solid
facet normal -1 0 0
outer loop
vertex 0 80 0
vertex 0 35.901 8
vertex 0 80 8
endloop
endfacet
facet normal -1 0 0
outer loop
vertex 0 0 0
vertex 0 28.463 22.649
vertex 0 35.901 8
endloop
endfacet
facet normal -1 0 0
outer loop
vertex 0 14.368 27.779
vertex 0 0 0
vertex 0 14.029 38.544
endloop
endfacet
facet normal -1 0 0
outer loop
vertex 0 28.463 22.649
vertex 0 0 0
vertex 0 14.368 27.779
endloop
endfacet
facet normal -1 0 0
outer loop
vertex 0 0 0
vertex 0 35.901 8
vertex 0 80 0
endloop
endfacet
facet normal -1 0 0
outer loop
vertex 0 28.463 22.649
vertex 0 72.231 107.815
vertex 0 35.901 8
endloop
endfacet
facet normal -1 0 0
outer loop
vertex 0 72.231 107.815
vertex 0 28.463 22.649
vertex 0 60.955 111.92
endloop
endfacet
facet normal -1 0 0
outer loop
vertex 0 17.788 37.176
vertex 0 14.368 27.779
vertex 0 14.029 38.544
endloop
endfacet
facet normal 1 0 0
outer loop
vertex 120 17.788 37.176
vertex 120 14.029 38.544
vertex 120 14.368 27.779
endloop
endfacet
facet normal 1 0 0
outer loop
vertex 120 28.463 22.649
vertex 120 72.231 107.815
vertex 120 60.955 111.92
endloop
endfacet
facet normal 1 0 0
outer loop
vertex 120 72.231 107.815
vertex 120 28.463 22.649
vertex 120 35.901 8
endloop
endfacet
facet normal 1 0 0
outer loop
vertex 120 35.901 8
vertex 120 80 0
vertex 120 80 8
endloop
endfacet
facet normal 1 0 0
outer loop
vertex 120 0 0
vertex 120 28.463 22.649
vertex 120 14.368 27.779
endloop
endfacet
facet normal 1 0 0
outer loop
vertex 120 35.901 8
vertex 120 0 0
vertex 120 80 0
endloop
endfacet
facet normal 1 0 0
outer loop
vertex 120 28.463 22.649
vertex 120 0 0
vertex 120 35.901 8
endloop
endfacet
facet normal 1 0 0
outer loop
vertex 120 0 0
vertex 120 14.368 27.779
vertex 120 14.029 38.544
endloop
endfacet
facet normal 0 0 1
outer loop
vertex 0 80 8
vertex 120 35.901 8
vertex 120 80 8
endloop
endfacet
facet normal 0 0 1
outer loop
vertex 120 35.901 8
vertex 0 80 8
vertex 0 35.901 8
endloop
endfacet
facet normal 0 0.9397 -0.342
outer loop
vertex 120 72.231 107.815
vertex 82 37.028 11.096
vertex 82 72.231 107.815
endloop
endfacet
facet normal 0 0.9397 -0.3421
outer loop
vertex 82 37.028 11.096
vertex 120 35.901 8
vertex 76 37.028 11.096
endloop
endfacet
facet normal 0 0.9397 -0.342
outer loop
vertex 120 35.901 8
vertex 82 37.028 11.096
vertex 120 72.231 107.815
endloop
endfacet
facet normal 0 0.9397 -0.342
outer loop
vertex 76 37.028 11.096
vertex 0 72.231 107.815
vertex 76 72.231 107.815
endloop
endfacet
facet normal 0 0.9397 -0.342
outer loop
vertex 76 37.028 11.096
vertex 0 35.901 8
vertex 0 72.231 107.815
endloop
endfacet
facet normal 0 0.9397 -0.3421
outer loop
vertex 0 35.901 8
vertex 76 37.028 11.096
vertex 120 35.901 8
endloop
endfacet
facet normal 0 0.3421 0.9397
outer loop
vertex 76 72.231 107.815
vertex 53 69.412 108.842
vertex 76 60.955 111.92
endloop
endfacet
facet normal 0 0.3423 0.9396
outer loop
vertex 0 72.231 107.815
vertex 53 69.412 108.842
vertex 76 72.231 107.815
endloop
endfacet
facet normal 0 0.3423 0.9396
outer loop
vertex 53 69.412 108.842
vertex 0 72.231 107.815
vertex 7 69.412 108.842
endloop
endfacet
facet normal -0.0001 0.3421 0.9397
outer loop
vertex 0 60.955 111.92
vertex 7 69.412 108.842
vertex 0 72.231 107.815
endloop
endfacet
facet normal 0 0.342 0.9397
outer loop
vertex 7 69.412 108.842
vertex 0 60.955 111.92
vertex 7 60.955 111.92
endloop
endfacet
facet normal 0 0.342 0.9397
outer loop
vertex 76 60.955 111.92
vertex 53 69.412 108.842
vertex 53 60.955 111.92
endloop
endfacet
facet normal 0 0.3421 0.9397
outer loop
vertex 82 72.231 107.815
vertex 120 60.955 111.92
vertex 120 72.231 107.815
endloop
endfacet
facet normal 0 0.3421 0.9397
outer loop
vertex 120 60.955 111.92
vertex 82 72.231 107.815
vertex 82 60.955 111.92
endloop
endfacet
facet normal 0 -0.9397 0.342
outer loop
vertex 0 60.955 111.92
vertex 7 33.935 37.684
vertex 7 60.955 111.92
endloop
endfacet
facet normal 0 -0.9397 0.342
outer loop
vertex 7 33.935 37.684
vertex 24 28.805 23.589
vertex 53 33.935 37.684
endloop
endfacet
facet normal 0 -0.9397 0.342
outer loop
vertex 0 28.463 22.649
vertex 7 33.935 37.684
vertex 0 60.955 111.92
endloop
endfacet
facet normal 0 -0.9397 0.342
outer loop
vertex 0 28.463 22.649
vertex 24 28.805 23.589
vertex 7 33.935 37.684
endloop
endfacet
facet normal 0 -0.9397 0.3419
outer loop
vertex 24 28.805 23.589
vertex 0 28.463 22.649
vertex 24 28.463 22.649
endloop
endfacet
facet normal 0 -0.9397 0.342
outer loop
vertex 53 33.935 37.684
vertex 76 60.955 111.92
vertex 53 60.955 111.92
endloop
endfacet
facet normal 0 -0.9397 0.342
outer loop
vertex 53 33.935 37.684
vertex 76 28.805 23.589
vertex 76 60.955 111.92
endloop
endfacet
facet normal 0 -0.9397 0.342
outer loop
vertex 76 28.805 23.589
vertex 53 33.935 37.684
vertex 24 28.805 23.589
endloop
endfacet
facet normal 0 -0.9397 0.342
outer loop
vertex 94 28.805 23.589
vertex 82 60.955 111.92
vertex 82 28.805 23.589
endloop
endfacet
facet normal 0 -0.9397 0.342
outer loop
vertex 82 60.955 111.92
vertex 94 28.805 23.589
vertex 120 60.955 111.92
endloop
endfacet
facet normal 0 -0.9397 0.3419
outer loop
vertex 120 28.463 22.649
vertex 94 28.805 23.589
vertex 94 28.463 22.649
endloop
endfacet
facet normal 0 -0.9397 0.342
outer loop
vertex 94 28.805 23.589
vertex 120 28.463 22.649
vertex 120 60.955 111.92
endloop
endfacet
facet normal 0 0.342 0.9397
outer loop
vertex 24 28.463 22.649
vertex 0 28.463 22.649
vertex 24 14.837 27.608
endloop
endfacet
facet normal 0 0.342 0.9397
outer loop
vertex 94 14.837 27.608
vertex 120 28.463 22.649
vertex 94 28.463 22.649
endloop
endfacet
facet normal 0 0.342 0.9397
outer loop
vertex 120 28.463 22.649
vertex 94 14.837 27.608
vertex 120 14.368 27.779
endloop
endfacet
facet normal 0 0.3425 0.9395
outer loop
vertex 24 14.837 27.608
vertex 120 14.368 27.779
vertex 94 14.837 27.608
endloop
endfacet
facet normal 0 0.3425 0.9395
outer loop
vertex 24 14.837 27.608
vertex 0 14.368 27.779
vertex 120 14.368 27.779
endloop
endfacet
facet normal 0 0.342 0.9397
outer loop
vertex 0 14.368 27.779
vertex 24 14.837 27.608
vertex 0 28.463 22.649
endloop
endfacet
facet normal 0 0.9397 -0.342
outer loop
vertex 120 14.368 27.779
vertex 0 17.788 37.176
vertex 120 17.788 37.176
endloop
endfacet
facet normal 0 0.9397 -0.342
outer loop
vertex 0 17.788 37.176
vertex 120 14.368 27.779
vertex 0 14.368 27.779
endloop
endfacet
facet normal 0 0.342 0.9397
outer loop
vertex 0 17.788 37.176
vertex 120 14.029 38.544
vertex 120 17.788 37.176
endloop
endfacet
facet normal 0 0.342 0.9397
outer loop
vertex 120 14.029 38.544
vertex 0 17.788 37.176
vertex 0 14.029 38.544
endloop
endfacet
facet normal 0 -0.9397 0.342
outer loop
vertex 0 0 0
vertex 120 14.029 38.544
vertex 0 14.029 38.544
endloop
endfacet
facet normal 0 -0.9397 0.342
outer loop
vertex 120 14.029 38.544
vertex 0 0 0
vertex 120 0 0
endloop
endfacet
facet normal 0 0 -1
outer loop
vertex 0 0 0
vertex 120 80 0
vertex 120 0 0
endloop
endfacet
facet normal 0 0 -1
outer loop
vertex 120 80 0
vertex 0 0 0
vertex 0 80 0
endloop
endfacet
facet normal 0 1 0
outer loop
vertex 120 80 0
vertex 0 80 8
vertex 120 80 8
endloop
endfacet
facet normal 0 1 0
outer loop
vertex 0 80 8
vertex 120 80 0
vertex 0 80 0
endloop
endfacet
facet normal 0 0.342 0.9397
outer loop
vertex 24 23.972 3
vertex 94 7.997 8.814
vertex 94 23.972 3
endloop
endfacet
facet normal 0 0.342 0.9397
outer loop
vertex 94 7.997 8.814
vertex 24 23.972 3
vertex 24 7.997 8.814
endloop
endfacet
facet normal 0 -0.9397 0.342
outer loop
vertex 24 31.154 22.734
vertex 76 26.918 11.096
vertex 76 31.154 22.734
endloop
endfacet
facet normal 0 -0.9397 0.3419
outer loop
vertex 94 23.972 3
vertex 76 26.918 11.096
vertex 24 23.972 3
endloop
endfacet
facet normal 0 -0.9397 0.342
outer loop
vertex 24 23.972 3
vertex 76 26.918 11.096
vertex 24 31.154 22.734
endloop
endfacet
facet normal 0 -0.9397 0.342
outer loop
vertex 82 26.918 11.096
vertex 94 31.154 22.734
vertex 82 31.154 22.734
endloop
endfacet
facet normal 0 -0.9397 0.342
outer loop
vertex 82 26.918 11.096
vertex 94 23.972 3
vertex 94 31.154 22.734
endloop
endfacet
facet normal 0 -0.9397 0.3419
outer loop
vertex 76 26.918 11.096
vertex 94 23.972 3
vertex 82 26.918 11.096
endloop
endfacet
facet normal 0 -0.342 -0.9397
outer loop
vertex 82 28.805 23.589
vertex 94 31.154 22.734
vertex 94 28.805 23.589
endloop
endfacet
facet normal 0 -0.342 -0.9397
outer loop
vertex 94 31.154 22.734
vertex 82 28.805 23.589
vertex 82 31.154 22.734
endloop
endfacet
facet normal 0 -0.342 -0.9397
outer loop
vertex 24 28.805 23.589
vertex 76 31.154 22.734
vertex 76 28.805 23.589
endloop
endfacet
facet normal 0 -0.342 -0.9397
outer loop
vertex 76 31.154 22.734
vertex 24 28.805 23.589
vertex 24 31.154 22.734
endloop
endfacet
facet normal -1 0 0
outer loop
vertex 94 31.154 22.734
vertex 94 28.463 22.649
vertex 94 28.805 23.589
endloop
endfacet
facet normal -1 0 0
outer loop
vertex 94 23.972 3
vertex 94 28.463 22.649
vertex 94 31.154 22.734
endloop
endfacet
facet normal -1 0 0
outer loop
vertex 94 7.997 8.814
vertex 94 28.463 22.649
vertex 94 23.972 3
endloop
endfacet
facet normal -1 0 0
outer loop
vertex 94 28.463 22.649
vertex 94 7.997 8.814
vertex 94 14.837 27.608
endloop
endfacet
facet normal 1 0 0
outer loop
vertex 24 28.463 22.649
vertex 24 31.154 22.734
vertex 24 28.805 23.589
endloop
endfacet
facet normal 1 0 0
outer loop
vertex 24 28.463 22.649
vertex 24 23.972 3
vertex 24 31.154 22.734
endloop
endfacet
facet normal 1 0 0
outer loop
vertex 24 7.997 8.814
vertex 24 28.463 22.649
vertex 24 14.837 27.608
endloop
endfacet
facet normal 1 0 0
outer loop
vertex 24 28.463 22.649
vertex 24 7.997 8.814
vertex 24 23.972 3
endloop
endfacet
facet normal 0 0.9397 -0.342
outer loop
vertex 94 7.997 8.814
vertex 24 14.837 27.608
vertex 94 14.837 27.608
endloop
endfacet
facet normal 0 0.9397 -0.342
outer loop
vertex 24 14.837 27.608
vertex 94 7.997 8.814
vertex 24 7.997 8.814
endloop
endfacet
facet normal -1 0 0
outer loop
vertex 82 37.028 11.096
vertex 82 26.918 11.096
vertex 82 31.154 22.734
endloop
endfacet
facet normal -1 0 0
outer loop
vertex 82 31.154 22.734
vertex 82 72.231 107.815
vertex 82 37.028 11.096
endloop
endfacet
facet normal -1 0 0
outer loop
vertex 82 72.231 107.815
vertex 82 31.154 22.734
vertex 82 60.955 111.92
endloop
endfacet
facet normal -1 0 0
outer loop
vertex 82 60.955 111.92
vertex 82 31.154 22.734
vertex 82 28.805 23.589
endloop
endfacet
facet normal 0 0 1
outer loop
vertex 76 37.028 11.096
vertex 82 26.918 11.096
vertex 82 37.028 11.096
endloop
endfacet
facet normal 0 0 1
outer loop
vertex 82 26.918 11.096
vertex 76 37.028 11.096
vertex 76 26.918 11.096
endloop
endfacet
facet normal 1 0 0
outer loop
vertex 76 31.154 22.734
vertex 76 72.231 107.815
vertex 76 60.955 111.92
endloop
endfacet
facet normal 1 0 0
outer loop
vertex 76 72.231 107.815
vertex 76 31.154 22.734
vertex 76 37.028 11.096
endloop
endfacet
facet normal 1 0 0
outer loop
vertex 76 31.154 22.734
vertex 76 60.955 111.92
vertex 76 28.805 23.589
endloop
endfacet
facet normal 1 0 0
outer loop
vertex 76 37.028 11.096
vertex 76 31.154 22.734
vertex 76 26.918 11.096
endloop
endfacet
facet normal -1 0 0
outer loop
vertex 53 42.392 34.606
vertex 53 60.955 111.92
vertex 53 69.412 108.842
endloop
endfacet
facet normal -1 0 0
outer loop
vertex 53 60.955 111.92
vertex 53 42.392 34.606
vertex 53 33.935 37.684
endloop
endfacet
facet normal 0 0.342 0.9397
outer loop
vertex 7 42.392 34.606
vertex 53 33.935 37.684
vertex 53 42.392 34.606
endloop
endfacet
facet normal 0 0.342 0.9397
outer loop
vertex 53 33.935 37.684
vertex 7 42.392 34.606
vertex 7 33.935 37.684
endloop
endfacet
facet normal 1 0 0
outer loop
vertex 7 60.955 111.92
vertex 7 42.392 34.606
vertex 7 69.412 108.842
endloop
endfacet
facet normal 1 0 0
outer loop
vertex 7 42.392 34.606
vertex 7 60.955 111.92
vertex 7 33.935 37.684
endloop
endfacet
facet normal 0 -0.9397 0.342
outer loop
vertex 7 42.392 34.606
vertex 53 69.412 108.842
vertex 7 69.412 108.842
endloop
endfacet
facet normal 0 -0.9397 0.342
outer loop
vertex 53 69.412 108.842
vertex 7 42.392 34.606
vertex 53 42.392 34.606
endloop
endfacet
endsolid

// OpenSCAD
// Ladeständer für PocketBook Era Color (mit Hülle + Popsocket), Gerät quer,
// Ladebuchse unten, gewinkelter USB-C-Stecker hängt frei in einem Schacht
// Alle Maße in Millimetern (Regel: units-mm)
//
// Kontext (Regel: context-first):
//   - context/printer.md:    Anycubic Kobra S1, 0.4mm Düse, PEI, 250mm Bauraum
//   - context/tolerances.md: kein Passsitz im Teil. Geräteschlitz bewusst
//                            locker (+1 mm/Seite), Stecker/Kabel mit viel Luft.
//   - context/materials.md:  PLA, Rechenwerte (Dichte 1.24, Füllung ~0.6)
//
// ---------------------------------------------------------------------------
// ANFORDERUNGSTABELLE (Design-Gespräch, vom Nutzer bestätigt)
// ---------------------------------------------------------------------------
// | ID  | Anforderung                         | Soll                                   | Quelle        | Prüfmethode                          |
// |-----|-------------------------------------|----------------------------------------|---------------|--------------------------------------|
// | R1  | Gerät quer: 162 br. x 145 h x 13 d  | Aufnahme passend, Gerät darf seitlich   | 145 gemessen, | Bounding Box, Schnitte               |
// |     |                                     | überstehen                             | 162 geschätzt,|                                      |
// |     |                                     |                                        | 13 ca. gem.   |                                      |
// | R2  | Schlitz für die Dicke               | 15 mm (+1/-0), locker                  | ca. gemessen  | Schnitt quer                         |
// | R3  | Neigung                             | 70° ±1° gegen den Tisch                | Nutzer        | Schnitt quer, Winkel                 |
// | R4  | Gerät auf zwei Auflagen, nicht auf  | Schacht unter der Buchse 70 mm lang (X)| angenommen    | Schnitt z = Auflagehöhe              |
// |     | dem Stecker                         | x 17 mm tief (quer zum Gerät)          |               |                                      |
// | R5  | Buchsenposition                     | Mitte ~80 mm vom linken Ende, mittig   | geschätzt     | Schacht zentriert darauf             |
// |     |                                     | in der Dicke                           |               |                                      |
// | R6  | Freiraum Winkelstecker              | Schachttiefe unter dem Gerät >= 20 mm  | angenommen    | Schnitt, Kollisionsteil Stecker      |
// |     |                                     | (Stecker ~15 lang, 12 x 7)             |               |                                      |
// | R7  | Kabelkanal oben offen, nach hinten  | Breite >= 5 mm, Kabel von oben einlegbar| angenommen   | Schnitt, Sichtprüfung                |
// | R8  | Popsocket frei: Ø40 x 7, Mitte 39   | Aussparung >= Ø46, Tiefe >= 9          | geschätzt     | Schnitt, Kollisionsteil              |
// |     | über Unterkante, 51 vom linken Ende |                                        |               |                                      |
// | R9  | Lippe vorne hält die Unterkante     | ~10 mm hoch                            | angenommen    | Schnitt quer                         |
// | R10 | Rückenstütze trägt über dem Schwer- | Anlage bis >= 90 mm über Unterkante    | angenommen    | Schnitt quer                         |
// |     | punkt                               |                                        |               |                                      |
// | R11 | Kippsicher, nur Laden               | Kippwinkel vorne und hinten >= 15°,    | angenommen    | echo(), load-case-check              |
// |     |                                     | mit 330 g                              |               |                                      |
// | R12 | PLA, ohne Stützen druckbar          | Überhang <= 45°, Wände >= 0.8 mm       | Nutzer        | G4                                   |
// | R13 | Druckraum                           | <= 250 x 250 x 250                     | Drucker       | Bounding Box                         |
// | R14 | Teile im print                      | 1 Volumen                              | -             | check.py Volumes                     |
// | R15 | Passtest                            | Teil fit_test: Sockelausschnitt mit    | -             | Druck vor dem ganzen Teil            |
// |     |                                     | Schacht, Kanal, Auflagen               |               |                                      |
//
// Stecker: UGREEN 60W USB-C Winkel 90°. Herstellermaße nicht gefunden ->
// plug_* und cable_d sind ANNAHMEN. Annahme: das Kabel geht parallel zur
// Geräteunterkante ab (X). Steckerseite so wählen, dass es nach rechts
// (zum Kanal) abgeht – USB-C ist verdrehbar.
//
// ---------------------------------------------------------------------------
// Koordinaten
// ---------------------------------------------------------------------------
// X = Breite (x = 0 am linken Ende des Geräts, von vorne gesehen),
// Y = Tiefe (y = 0 Vorderkante Fuß, +Y nach hinten), Z = Höhe.
// Gerätesystem (n, u): u entlang der Gerätefläche nach oben (um tilt nach
// hinten geneigt), n senkrecht dazu nach hinten. Ursprung O = Schnitt von
// Lippen-Innenseite und Auflage. Der Schlitz reicht von n = 0 (Lippe) bis
// n = slot_w (Rückenstütze); das Gerät lehnt an der Stütze.
//
// Aufbau: ein Profil in (Y, Z), über stand_w in X extrudiert:
//   Fuß vorne (massiv unter dem Schlitz), Lippe, Auflage senkrecht zur
//   Gerätefläche, geneigte Rückenstütze als Platte, flache Fußplatte nach
//   hinten. Ausgeschnitten: Steckerschacht unter der Buchse, Kabelkanal
//   (oben offen) nach hinten, Popsocket-Tasche (oben offen) in der Stütze.
//
// Druckausrichtung (part = "print"): so wie er steht, Fußunterseite aufs
// Bett. Keine Brücken (Schacht, Kanal und Tasche sind oben offen). Stärkster
// Überhang: Lippen-Innenseite und Rückseite der Stütze, je tilt = 20° aus
// der Senkrechten.
//
// LASTFÄLLE (rule load-case-check): Das Teil wird nicht bedient, nur
// abgestellt. Bruch unkritisch (330 g auf ~12 mm PLA-Platte, Spannungen
// << 1 MPa). Rutschen unkritisch (Lippe hält formschlüssig). Maßgebend ist
// Kippen, nach hinten (Anstoßen an der Geräteoberkante). echo() unten.

/* [Gerät] */
// Breite quer (lange Kante, mit Hülle) – GESCHÄTZT
dev_w = 162;
// Höhe quer (kurze Kante, mit Hülle) – gemessen
dev_h = 145;
// Dicke mit Hülle, ohne Popsocket – ca. gemessen
dev_t = 13;
// Masse Gerät + Hülle in g – ANNAHME (nur echo)
dev_mass_g = 330;

/* [Popsocket (Rückseite, eingeklappt)] */
pop_d = 40;
pop_h = 7;
// Mitte vom linken Ende (Frontansicht)
pop_x = 51;
// Mitte über der Geräteunterkante
pop_u = 39;
// Luft ringsum in der Tasche
pop_clear = 3;
// Luft hinter dem Popsocket
pop_clear_back = 2;

/* [Buchse und Winkelstecker – ANNAHMEN] */
// Buchsenmitte vom linken Ende
port_x = 80;
// Steckergehäuse: Breite (X), Dicke (n), Länge aus dem Gerät
plug_w = 12;
plug_t = 7;
plug_l = 15;
cable_d = 4;

/* [Ständer] */
// Neigung gegen den Tisch
stand_angle = 70;
// Luft im Schlitz gesamt (Schlitz = dev_t + slot_clear)
slot_clear = 2;
// Breite des Ständers (X), mittig unter dem Gerät
stand_w = 120;
// Lippe vorne: Dicke, Höhe über der Auflage
lip_t = 4;
lip_h = 10;
// Rückenstütze: Anlagehöhe über der Auflage, Plattendicke
back_h = 95;
back_t = 12;
// Fußplatte hinten: Gesamttiefe des Fußes, Höhe
base_d = 80;
base_h = 8;
// Boden unter dem tiefsten Punkt des Schachts
floor_t = 3;

/* [Schacht und Kanal] */
shaft_l = 70;
shaft_w = 17;
shaft_d = 20;
// Kanal nach hinten: X-Position (rechts neben dem Stecker, Platz zum Biegen)
channel_x = 100;
channel_w = 6;

/* [Ansicht] */
part = "print"; // [print, stand, fit_test, assembly, interference]

/* [Hidden] */
nozzle = 0.4;
min_w = 2 * nozzle;
bed = 250;
rho_pla = 1.24;   // g/cm³
fill = 0.6;       // effektive Füllung für Massenschätzung
eps = 0.01;
col_stand = "MidnightBlue";
$fn = 64;

tilt = 90 - stand_angle;       // Neigung aus der Senkrechten
s = sin(tilt);
c = cos(tilt);
slot_w = dev_t + slot_clear;
n_dev0 = slot_w - dev_t;       // Gerät lehnt an der Stütze
n_plug = n_dev0 + dev_t / 2;   // Buchse mittig in der Dicke
// Schachtvorderwand nie genau in der Ebene der Lippen-Innenseite (n = 0):
// koplanare Flächen ergeben Null-Dreiecke in der STL (F7)
shaft_n0 = max(n_plug - shaft_w / 2, 0.5);
shaft_n1 = shaft_n0 + shaft_w;
n_rear = slot_w + back_t;      // Rückseite der Stütze
sx0 = (dev_w - stand_w) / 2;   // Ständer mittig unter dem Gerät
sx1 = sx0 + stand_w;

// Ursprung O: tiefster Schachtpunkt (n = shaft_n1, u = -shaft_d) liegt auf
// z = floor_t; Lippen-Vorderkante trifft den Tisch bei y = 0.
Oz = floor_t + shaft_n1 * s + shaft_d * c;
u_a = -(Oz + lip_t * s) / c;
Oy = lip_t * c - u_a * s;

function F(n, u) = [Oy + n * c + u * s, Oz - n * s + u * c];

u_J = (base_h - Oz + n_rear * s) / c;   // Stützen-Rückseite trifft Fußplatte
PROFILE = [
    [0, 0], [base_d, 0], [base_d, base_h],
    F(n_rear, u_J), F(n_rear, back_h), F(slot_w, back_h),
    F(slot_w, 0), F(0, 0), F(0, lip_h), F(-lip_t, lip_h)
];

// Kabel verlässt den Stecker knapp über dessen Ende, Kanalboden darunter
cab_u = -plug_l + cable_d / 2 + 1;
cab_P = F(n_plug, cab_u);
channel_z0 = cab_P[1] - cable_d / 2 - 0.5;
channel_y0 = F(0, lip_h)[0] + 0.5;      // hinter der Lippe, schneidet sie nicht

pocket_w = pop_d + 2 * pop_clear;
pocket_dep = pop_h + pop_clear_back;
pocket_x0 = pop_x - pocket_w / 2;
pocket_x1 = pop_x + pocket_w / 2;

// Polygonfläche und Schwerpunkt (Shoelace)
function sumv(v, i = 0) = i >= len(v) ? 0 : v[i] + sumv(v, i + 1);
function cr(P, i) = let(a = P[i], b = P[(i + 1) % len(P)]) a[0] * b[1] - b[0] * a[1];
function parea(P) = sumv([for (i = [0 : len(P) - 1]) cr(P, i)]) / 2;
function pcent(P) = let(A = parea(P)) [
    sumv([for (i = [0 : len(P) - 1]) (P[i][0] + P[(i + 1) % len(P)][0]) * cr(P, i)]) / (6 * A),
    sumv([for (i = [0 : len(P) - 1]) (P[i][1] + P[(i + 1) % len(P)][1]) * cr(P, i)]) / (6 * A)];

// ---------------------------------------------------------------------------
// Kontrollen
// ---------------------------------------------------------------------------
assert(abs(slot_w - 15) <= 1 && slot_w >= 15, str("R2: Schlitz ", slot_w));
assert(stand_angle >= 60 && stand_angle <= 80, "Neigung unplausibel");
assert(stand_w <= dev_w, "R1: Ständer breiter als das Gerät");
assert(shaft_n0 >= -eps && shaft_n1 <= n_rear - min_w, "Schacht ragt aus Lippe/Stütze");
assert(shaft_d >= plug_l + 5, str("R6: Schacht zu flach für den Stecker: ", shaft_d));
assert(shaft_w >= plug_t + 2 * 2 && shaft_w >= cable_d + 2 * 2, "Schacht zu schmal");
assert(port_x - shaft_l / 2 >= sx0 + 10 && port_x + shaft_l / 2 <= sx1 - 10,
       "R4: Auflagen neben dem Schacht < 10 mm");
assert(shaft_l / 2 - plug_w / 2 >= 8, "R5: Schacht deckt Lageunsicherheit ±8 nicht ab");
assert(channel_x + channel_w / 2 <= port_x + shaft_l / 2 - 2, "Kanal liegt nicht am Schacht");
assert(channel_x - channel_w / 2 >= port_x + plug_w / 2 + 4, "Kanal zu nah am Stecker (Biegung)");
assert(channel_w >= cable_d + 1 && channel_w >= 5, "R7: Kanal zu schmal");
assert(channel_z0 >= floor_t, str("Kanalboden unter Bodenstärke: ", channel_z0));
assert(pocket_x0 >= sx0 + 2 * min_w, "Popsocket-Tasche schneidet die linke Ständerkante");
assert(pocket_x1 <= channel_x - channel_w / 2 - 2 * min_w, "Tasche zu nah am Kanal");
assert(back_t - pocket_dep >= 2 * min_w, str("Rest hinter der Tasche: ", back_t - pocket_dep));
assert(pop_u - pocket_w / 2 > 0 && pop_u + pocket_w / 2 < dev_h, "Popsocket außerhalb Gerät");
assert(back_h >= 90 && back_h < dev_h, "R10: Anlagehöhe");
assert(lip_t >= 2 * min_w && lip_h >= 8, "R9: Lippe");
assert(F(n_rear, u_J)[0] < base_d - 10, "Fußplatte hinter der Stütze zu kurz");
assert(max([for (p = PROFILE) p[0]]) <= bed && stand_w <= bed &&
       max([for (p = PROFILE) p[1]]) <= bed, "R13: größer als Bauraum");

// ---------------------------------------------------------------------------
// Kippen (R11). Konservativ: nur Gerät. Zusätzlich mit Ständermasse
// (Profilfläche x Breite, Ausschnitte ignoriert -> Masse leicht zu hoch).
// ---------------------------------------------------------------------------
dev_cg = F(n_dev0 + dev_t / 2, dev_h / 2);
st_cg = pcent(PROFILE);
st_mass_g = parea(PROFILE) * stand_w / 1000 * rho_pla * fill;
tot_mass = dev_mass_g + st_mass_g;
tot_cg = (dev_cg * dev_mass_g + st_cg * st_mass_g) / tot_mass;
dev_top = F(n_dev0, dev_h);
tip_f_dev = atan(dev_cg[0] / dev_cg[1]);
tip_b_dev = atan((base_d - dev_cg[0]) / dev_cg[1]);
tip_f_tot = atan(tot_cg[0] / tot_cg[1]);
tip_b_tot = atan((base_d - tot_cg[0]) / tot_cg[1]);
push_b_g = tot_mass * (base_d - tot_cg[0]) / dev_top[1];   // horizontal an der Geräteoberkante
assert(tip_f_dev >= 15 && tip_b_dev >= 15,
       str("R11: Kippwinkel (nur Gerät) vorne ", tip_f_dev, "° hinten ", tip_b_dev, "°"));

echo(str("Schlitz ", slot_w, " mm, Neigung ", stand_angle, "°, Auflage auf z = ", Oz, " (vorne) bis ", F(slot_w, 0)[1]));
echo(str("Ständer: ", stand_w, " x ", base_d, " x ", max([for (p = PROFILE) p[1]]), " mm, Masse ~", st_mass_g, " g (Schätzung)"));
echo(str("Kippen nur Gerät: vorne ", tip_f_dev, "°, hinten ", tip_b_dev, "°"));
echo(str("Kippen mit Ständer: vorne ", tip_f_tot, "°, hinten ", tip_b_tot, "°"));
echo(str("Schub an der Geräteoberkante nach hinten bis Kippen: ~", push_b_g, " g"));
echo(str("Kanal: x = ", channel_x, ", Boden z = ", channel_z0, ", Rest hinter Tasche ", back_t - pocket_dep, " mm"));

// ---------------------------------------------------------------------------
// Geometrie
// ---------------------------------------------------------------------------
// Gerätesystem: lokal x -> X, y -> n, z -> u
module in_dev() {
    multmatrix([[1, 0, 0, 0], [0, c, s, Oy], [0, -s, c, Oz], [0, 0, 0, 1]]) children();
}

module profile_solid() {
    translate([sx0, 0, 0]) rotate([90, 0, 90])
        linear_extrude(height = stand_w) polygon(PROFILE);
}

module stand() {
    difference() {
        profile_solid();
        // Steckerschacht (R4, R6)
        in_dev() translate([port_x - shaft_l / 2, shaft_n0, -shaft_d])
            cube([shaft_l, shaft_w, shaft_d + 1]);
        // Kabelkanal nach hinten, oben offen (R7)
        translate([channel_x - channel_w / 2, channel_y0, channel_z0])
            cube([channel_w, base_d + 1 - channel_y0, bed]);
        // Popsocket-Tasche, oben offen (R8)
        in_dev() translate([pocket_x0, slot_w - 1, pop_u - pocket_w / 2])
            cube([pocket_w, pocket_dep + 1, dev_h]);
    }
}

// Dummies (nicht gedruckt)
module device(g = 0) {
    in_dev() {
        translate([g, n_dev0 + g, g]) cube([dev_w - 2 * g, dev_t - 2 * g, dev_h - 2 * g]);
        translate([pop_x, slot_w + g, pop_u]) rotate([-90, 0, 0])
            cylinder(d = pop_d, h = pop_h - g);
    }
}
module plug() {
    in_dev() translate([port_x - plug_w / 2, n_plug - plug_t / 2, -plug_l])
        cube([plug_w, plug_t, plug_l]);
}
module cable() {
    in_dev() translate([port_x, n_plug, cab_u]) rotate([0, 90, 0])
        cylinder(d = cable_d, h = channel_x - port_x);
    translate([channel_x, cab_P[0], cab_P[1]]) sphere(d = cable_d);
    translate([channel_x, cab_P[0], cab_P[1]]) rotate([-90, 0, 0])
        cylinder(d = cable_d, h = base_d + 20 - cab_P[0]);
}

fx0 = port_x - shaft_l / 2 - 8;
fx1 = port_x + shaft_l / 2 + 8;
fz1 = F(-lip_t, lip_h)[1] + 3;
fy1 = F(n_rear, u_J)[0] + 3;
module fit_test() {
    intersection() {
        stand();
        translate([fx0, -1, -1]) cube([fx1 - fx0, fy1 + 1, fz1 + 1]);
    }
}

if (part == "print") {
    color(col_stand) translate([-sx0, 0, 0]) render(convexity = 6) stand();
} else if (part == "stand") {
    color(col_stand) render(convexity = 6) stand();
} else if (part == "fit_test") {
    color(col_stand) translate([-fx0, 0, 0]) render(convexity = 6) fit_test();
} else if (part == "assembly") {
    color(col_stand) render(convexity = 6) stand();
    color("Gray", 0.6) device();
    color("White") plug();
    color("DimGray") cable();
} else if (part == "interference") {
    // Kontakt Gerät/Auflage/Stütze ist gewollt -> Dummies um 0.05 geschrumpft
    intersection() {
        stand();
        union() { device(0.05); plug(); cable(); }
    }
}
